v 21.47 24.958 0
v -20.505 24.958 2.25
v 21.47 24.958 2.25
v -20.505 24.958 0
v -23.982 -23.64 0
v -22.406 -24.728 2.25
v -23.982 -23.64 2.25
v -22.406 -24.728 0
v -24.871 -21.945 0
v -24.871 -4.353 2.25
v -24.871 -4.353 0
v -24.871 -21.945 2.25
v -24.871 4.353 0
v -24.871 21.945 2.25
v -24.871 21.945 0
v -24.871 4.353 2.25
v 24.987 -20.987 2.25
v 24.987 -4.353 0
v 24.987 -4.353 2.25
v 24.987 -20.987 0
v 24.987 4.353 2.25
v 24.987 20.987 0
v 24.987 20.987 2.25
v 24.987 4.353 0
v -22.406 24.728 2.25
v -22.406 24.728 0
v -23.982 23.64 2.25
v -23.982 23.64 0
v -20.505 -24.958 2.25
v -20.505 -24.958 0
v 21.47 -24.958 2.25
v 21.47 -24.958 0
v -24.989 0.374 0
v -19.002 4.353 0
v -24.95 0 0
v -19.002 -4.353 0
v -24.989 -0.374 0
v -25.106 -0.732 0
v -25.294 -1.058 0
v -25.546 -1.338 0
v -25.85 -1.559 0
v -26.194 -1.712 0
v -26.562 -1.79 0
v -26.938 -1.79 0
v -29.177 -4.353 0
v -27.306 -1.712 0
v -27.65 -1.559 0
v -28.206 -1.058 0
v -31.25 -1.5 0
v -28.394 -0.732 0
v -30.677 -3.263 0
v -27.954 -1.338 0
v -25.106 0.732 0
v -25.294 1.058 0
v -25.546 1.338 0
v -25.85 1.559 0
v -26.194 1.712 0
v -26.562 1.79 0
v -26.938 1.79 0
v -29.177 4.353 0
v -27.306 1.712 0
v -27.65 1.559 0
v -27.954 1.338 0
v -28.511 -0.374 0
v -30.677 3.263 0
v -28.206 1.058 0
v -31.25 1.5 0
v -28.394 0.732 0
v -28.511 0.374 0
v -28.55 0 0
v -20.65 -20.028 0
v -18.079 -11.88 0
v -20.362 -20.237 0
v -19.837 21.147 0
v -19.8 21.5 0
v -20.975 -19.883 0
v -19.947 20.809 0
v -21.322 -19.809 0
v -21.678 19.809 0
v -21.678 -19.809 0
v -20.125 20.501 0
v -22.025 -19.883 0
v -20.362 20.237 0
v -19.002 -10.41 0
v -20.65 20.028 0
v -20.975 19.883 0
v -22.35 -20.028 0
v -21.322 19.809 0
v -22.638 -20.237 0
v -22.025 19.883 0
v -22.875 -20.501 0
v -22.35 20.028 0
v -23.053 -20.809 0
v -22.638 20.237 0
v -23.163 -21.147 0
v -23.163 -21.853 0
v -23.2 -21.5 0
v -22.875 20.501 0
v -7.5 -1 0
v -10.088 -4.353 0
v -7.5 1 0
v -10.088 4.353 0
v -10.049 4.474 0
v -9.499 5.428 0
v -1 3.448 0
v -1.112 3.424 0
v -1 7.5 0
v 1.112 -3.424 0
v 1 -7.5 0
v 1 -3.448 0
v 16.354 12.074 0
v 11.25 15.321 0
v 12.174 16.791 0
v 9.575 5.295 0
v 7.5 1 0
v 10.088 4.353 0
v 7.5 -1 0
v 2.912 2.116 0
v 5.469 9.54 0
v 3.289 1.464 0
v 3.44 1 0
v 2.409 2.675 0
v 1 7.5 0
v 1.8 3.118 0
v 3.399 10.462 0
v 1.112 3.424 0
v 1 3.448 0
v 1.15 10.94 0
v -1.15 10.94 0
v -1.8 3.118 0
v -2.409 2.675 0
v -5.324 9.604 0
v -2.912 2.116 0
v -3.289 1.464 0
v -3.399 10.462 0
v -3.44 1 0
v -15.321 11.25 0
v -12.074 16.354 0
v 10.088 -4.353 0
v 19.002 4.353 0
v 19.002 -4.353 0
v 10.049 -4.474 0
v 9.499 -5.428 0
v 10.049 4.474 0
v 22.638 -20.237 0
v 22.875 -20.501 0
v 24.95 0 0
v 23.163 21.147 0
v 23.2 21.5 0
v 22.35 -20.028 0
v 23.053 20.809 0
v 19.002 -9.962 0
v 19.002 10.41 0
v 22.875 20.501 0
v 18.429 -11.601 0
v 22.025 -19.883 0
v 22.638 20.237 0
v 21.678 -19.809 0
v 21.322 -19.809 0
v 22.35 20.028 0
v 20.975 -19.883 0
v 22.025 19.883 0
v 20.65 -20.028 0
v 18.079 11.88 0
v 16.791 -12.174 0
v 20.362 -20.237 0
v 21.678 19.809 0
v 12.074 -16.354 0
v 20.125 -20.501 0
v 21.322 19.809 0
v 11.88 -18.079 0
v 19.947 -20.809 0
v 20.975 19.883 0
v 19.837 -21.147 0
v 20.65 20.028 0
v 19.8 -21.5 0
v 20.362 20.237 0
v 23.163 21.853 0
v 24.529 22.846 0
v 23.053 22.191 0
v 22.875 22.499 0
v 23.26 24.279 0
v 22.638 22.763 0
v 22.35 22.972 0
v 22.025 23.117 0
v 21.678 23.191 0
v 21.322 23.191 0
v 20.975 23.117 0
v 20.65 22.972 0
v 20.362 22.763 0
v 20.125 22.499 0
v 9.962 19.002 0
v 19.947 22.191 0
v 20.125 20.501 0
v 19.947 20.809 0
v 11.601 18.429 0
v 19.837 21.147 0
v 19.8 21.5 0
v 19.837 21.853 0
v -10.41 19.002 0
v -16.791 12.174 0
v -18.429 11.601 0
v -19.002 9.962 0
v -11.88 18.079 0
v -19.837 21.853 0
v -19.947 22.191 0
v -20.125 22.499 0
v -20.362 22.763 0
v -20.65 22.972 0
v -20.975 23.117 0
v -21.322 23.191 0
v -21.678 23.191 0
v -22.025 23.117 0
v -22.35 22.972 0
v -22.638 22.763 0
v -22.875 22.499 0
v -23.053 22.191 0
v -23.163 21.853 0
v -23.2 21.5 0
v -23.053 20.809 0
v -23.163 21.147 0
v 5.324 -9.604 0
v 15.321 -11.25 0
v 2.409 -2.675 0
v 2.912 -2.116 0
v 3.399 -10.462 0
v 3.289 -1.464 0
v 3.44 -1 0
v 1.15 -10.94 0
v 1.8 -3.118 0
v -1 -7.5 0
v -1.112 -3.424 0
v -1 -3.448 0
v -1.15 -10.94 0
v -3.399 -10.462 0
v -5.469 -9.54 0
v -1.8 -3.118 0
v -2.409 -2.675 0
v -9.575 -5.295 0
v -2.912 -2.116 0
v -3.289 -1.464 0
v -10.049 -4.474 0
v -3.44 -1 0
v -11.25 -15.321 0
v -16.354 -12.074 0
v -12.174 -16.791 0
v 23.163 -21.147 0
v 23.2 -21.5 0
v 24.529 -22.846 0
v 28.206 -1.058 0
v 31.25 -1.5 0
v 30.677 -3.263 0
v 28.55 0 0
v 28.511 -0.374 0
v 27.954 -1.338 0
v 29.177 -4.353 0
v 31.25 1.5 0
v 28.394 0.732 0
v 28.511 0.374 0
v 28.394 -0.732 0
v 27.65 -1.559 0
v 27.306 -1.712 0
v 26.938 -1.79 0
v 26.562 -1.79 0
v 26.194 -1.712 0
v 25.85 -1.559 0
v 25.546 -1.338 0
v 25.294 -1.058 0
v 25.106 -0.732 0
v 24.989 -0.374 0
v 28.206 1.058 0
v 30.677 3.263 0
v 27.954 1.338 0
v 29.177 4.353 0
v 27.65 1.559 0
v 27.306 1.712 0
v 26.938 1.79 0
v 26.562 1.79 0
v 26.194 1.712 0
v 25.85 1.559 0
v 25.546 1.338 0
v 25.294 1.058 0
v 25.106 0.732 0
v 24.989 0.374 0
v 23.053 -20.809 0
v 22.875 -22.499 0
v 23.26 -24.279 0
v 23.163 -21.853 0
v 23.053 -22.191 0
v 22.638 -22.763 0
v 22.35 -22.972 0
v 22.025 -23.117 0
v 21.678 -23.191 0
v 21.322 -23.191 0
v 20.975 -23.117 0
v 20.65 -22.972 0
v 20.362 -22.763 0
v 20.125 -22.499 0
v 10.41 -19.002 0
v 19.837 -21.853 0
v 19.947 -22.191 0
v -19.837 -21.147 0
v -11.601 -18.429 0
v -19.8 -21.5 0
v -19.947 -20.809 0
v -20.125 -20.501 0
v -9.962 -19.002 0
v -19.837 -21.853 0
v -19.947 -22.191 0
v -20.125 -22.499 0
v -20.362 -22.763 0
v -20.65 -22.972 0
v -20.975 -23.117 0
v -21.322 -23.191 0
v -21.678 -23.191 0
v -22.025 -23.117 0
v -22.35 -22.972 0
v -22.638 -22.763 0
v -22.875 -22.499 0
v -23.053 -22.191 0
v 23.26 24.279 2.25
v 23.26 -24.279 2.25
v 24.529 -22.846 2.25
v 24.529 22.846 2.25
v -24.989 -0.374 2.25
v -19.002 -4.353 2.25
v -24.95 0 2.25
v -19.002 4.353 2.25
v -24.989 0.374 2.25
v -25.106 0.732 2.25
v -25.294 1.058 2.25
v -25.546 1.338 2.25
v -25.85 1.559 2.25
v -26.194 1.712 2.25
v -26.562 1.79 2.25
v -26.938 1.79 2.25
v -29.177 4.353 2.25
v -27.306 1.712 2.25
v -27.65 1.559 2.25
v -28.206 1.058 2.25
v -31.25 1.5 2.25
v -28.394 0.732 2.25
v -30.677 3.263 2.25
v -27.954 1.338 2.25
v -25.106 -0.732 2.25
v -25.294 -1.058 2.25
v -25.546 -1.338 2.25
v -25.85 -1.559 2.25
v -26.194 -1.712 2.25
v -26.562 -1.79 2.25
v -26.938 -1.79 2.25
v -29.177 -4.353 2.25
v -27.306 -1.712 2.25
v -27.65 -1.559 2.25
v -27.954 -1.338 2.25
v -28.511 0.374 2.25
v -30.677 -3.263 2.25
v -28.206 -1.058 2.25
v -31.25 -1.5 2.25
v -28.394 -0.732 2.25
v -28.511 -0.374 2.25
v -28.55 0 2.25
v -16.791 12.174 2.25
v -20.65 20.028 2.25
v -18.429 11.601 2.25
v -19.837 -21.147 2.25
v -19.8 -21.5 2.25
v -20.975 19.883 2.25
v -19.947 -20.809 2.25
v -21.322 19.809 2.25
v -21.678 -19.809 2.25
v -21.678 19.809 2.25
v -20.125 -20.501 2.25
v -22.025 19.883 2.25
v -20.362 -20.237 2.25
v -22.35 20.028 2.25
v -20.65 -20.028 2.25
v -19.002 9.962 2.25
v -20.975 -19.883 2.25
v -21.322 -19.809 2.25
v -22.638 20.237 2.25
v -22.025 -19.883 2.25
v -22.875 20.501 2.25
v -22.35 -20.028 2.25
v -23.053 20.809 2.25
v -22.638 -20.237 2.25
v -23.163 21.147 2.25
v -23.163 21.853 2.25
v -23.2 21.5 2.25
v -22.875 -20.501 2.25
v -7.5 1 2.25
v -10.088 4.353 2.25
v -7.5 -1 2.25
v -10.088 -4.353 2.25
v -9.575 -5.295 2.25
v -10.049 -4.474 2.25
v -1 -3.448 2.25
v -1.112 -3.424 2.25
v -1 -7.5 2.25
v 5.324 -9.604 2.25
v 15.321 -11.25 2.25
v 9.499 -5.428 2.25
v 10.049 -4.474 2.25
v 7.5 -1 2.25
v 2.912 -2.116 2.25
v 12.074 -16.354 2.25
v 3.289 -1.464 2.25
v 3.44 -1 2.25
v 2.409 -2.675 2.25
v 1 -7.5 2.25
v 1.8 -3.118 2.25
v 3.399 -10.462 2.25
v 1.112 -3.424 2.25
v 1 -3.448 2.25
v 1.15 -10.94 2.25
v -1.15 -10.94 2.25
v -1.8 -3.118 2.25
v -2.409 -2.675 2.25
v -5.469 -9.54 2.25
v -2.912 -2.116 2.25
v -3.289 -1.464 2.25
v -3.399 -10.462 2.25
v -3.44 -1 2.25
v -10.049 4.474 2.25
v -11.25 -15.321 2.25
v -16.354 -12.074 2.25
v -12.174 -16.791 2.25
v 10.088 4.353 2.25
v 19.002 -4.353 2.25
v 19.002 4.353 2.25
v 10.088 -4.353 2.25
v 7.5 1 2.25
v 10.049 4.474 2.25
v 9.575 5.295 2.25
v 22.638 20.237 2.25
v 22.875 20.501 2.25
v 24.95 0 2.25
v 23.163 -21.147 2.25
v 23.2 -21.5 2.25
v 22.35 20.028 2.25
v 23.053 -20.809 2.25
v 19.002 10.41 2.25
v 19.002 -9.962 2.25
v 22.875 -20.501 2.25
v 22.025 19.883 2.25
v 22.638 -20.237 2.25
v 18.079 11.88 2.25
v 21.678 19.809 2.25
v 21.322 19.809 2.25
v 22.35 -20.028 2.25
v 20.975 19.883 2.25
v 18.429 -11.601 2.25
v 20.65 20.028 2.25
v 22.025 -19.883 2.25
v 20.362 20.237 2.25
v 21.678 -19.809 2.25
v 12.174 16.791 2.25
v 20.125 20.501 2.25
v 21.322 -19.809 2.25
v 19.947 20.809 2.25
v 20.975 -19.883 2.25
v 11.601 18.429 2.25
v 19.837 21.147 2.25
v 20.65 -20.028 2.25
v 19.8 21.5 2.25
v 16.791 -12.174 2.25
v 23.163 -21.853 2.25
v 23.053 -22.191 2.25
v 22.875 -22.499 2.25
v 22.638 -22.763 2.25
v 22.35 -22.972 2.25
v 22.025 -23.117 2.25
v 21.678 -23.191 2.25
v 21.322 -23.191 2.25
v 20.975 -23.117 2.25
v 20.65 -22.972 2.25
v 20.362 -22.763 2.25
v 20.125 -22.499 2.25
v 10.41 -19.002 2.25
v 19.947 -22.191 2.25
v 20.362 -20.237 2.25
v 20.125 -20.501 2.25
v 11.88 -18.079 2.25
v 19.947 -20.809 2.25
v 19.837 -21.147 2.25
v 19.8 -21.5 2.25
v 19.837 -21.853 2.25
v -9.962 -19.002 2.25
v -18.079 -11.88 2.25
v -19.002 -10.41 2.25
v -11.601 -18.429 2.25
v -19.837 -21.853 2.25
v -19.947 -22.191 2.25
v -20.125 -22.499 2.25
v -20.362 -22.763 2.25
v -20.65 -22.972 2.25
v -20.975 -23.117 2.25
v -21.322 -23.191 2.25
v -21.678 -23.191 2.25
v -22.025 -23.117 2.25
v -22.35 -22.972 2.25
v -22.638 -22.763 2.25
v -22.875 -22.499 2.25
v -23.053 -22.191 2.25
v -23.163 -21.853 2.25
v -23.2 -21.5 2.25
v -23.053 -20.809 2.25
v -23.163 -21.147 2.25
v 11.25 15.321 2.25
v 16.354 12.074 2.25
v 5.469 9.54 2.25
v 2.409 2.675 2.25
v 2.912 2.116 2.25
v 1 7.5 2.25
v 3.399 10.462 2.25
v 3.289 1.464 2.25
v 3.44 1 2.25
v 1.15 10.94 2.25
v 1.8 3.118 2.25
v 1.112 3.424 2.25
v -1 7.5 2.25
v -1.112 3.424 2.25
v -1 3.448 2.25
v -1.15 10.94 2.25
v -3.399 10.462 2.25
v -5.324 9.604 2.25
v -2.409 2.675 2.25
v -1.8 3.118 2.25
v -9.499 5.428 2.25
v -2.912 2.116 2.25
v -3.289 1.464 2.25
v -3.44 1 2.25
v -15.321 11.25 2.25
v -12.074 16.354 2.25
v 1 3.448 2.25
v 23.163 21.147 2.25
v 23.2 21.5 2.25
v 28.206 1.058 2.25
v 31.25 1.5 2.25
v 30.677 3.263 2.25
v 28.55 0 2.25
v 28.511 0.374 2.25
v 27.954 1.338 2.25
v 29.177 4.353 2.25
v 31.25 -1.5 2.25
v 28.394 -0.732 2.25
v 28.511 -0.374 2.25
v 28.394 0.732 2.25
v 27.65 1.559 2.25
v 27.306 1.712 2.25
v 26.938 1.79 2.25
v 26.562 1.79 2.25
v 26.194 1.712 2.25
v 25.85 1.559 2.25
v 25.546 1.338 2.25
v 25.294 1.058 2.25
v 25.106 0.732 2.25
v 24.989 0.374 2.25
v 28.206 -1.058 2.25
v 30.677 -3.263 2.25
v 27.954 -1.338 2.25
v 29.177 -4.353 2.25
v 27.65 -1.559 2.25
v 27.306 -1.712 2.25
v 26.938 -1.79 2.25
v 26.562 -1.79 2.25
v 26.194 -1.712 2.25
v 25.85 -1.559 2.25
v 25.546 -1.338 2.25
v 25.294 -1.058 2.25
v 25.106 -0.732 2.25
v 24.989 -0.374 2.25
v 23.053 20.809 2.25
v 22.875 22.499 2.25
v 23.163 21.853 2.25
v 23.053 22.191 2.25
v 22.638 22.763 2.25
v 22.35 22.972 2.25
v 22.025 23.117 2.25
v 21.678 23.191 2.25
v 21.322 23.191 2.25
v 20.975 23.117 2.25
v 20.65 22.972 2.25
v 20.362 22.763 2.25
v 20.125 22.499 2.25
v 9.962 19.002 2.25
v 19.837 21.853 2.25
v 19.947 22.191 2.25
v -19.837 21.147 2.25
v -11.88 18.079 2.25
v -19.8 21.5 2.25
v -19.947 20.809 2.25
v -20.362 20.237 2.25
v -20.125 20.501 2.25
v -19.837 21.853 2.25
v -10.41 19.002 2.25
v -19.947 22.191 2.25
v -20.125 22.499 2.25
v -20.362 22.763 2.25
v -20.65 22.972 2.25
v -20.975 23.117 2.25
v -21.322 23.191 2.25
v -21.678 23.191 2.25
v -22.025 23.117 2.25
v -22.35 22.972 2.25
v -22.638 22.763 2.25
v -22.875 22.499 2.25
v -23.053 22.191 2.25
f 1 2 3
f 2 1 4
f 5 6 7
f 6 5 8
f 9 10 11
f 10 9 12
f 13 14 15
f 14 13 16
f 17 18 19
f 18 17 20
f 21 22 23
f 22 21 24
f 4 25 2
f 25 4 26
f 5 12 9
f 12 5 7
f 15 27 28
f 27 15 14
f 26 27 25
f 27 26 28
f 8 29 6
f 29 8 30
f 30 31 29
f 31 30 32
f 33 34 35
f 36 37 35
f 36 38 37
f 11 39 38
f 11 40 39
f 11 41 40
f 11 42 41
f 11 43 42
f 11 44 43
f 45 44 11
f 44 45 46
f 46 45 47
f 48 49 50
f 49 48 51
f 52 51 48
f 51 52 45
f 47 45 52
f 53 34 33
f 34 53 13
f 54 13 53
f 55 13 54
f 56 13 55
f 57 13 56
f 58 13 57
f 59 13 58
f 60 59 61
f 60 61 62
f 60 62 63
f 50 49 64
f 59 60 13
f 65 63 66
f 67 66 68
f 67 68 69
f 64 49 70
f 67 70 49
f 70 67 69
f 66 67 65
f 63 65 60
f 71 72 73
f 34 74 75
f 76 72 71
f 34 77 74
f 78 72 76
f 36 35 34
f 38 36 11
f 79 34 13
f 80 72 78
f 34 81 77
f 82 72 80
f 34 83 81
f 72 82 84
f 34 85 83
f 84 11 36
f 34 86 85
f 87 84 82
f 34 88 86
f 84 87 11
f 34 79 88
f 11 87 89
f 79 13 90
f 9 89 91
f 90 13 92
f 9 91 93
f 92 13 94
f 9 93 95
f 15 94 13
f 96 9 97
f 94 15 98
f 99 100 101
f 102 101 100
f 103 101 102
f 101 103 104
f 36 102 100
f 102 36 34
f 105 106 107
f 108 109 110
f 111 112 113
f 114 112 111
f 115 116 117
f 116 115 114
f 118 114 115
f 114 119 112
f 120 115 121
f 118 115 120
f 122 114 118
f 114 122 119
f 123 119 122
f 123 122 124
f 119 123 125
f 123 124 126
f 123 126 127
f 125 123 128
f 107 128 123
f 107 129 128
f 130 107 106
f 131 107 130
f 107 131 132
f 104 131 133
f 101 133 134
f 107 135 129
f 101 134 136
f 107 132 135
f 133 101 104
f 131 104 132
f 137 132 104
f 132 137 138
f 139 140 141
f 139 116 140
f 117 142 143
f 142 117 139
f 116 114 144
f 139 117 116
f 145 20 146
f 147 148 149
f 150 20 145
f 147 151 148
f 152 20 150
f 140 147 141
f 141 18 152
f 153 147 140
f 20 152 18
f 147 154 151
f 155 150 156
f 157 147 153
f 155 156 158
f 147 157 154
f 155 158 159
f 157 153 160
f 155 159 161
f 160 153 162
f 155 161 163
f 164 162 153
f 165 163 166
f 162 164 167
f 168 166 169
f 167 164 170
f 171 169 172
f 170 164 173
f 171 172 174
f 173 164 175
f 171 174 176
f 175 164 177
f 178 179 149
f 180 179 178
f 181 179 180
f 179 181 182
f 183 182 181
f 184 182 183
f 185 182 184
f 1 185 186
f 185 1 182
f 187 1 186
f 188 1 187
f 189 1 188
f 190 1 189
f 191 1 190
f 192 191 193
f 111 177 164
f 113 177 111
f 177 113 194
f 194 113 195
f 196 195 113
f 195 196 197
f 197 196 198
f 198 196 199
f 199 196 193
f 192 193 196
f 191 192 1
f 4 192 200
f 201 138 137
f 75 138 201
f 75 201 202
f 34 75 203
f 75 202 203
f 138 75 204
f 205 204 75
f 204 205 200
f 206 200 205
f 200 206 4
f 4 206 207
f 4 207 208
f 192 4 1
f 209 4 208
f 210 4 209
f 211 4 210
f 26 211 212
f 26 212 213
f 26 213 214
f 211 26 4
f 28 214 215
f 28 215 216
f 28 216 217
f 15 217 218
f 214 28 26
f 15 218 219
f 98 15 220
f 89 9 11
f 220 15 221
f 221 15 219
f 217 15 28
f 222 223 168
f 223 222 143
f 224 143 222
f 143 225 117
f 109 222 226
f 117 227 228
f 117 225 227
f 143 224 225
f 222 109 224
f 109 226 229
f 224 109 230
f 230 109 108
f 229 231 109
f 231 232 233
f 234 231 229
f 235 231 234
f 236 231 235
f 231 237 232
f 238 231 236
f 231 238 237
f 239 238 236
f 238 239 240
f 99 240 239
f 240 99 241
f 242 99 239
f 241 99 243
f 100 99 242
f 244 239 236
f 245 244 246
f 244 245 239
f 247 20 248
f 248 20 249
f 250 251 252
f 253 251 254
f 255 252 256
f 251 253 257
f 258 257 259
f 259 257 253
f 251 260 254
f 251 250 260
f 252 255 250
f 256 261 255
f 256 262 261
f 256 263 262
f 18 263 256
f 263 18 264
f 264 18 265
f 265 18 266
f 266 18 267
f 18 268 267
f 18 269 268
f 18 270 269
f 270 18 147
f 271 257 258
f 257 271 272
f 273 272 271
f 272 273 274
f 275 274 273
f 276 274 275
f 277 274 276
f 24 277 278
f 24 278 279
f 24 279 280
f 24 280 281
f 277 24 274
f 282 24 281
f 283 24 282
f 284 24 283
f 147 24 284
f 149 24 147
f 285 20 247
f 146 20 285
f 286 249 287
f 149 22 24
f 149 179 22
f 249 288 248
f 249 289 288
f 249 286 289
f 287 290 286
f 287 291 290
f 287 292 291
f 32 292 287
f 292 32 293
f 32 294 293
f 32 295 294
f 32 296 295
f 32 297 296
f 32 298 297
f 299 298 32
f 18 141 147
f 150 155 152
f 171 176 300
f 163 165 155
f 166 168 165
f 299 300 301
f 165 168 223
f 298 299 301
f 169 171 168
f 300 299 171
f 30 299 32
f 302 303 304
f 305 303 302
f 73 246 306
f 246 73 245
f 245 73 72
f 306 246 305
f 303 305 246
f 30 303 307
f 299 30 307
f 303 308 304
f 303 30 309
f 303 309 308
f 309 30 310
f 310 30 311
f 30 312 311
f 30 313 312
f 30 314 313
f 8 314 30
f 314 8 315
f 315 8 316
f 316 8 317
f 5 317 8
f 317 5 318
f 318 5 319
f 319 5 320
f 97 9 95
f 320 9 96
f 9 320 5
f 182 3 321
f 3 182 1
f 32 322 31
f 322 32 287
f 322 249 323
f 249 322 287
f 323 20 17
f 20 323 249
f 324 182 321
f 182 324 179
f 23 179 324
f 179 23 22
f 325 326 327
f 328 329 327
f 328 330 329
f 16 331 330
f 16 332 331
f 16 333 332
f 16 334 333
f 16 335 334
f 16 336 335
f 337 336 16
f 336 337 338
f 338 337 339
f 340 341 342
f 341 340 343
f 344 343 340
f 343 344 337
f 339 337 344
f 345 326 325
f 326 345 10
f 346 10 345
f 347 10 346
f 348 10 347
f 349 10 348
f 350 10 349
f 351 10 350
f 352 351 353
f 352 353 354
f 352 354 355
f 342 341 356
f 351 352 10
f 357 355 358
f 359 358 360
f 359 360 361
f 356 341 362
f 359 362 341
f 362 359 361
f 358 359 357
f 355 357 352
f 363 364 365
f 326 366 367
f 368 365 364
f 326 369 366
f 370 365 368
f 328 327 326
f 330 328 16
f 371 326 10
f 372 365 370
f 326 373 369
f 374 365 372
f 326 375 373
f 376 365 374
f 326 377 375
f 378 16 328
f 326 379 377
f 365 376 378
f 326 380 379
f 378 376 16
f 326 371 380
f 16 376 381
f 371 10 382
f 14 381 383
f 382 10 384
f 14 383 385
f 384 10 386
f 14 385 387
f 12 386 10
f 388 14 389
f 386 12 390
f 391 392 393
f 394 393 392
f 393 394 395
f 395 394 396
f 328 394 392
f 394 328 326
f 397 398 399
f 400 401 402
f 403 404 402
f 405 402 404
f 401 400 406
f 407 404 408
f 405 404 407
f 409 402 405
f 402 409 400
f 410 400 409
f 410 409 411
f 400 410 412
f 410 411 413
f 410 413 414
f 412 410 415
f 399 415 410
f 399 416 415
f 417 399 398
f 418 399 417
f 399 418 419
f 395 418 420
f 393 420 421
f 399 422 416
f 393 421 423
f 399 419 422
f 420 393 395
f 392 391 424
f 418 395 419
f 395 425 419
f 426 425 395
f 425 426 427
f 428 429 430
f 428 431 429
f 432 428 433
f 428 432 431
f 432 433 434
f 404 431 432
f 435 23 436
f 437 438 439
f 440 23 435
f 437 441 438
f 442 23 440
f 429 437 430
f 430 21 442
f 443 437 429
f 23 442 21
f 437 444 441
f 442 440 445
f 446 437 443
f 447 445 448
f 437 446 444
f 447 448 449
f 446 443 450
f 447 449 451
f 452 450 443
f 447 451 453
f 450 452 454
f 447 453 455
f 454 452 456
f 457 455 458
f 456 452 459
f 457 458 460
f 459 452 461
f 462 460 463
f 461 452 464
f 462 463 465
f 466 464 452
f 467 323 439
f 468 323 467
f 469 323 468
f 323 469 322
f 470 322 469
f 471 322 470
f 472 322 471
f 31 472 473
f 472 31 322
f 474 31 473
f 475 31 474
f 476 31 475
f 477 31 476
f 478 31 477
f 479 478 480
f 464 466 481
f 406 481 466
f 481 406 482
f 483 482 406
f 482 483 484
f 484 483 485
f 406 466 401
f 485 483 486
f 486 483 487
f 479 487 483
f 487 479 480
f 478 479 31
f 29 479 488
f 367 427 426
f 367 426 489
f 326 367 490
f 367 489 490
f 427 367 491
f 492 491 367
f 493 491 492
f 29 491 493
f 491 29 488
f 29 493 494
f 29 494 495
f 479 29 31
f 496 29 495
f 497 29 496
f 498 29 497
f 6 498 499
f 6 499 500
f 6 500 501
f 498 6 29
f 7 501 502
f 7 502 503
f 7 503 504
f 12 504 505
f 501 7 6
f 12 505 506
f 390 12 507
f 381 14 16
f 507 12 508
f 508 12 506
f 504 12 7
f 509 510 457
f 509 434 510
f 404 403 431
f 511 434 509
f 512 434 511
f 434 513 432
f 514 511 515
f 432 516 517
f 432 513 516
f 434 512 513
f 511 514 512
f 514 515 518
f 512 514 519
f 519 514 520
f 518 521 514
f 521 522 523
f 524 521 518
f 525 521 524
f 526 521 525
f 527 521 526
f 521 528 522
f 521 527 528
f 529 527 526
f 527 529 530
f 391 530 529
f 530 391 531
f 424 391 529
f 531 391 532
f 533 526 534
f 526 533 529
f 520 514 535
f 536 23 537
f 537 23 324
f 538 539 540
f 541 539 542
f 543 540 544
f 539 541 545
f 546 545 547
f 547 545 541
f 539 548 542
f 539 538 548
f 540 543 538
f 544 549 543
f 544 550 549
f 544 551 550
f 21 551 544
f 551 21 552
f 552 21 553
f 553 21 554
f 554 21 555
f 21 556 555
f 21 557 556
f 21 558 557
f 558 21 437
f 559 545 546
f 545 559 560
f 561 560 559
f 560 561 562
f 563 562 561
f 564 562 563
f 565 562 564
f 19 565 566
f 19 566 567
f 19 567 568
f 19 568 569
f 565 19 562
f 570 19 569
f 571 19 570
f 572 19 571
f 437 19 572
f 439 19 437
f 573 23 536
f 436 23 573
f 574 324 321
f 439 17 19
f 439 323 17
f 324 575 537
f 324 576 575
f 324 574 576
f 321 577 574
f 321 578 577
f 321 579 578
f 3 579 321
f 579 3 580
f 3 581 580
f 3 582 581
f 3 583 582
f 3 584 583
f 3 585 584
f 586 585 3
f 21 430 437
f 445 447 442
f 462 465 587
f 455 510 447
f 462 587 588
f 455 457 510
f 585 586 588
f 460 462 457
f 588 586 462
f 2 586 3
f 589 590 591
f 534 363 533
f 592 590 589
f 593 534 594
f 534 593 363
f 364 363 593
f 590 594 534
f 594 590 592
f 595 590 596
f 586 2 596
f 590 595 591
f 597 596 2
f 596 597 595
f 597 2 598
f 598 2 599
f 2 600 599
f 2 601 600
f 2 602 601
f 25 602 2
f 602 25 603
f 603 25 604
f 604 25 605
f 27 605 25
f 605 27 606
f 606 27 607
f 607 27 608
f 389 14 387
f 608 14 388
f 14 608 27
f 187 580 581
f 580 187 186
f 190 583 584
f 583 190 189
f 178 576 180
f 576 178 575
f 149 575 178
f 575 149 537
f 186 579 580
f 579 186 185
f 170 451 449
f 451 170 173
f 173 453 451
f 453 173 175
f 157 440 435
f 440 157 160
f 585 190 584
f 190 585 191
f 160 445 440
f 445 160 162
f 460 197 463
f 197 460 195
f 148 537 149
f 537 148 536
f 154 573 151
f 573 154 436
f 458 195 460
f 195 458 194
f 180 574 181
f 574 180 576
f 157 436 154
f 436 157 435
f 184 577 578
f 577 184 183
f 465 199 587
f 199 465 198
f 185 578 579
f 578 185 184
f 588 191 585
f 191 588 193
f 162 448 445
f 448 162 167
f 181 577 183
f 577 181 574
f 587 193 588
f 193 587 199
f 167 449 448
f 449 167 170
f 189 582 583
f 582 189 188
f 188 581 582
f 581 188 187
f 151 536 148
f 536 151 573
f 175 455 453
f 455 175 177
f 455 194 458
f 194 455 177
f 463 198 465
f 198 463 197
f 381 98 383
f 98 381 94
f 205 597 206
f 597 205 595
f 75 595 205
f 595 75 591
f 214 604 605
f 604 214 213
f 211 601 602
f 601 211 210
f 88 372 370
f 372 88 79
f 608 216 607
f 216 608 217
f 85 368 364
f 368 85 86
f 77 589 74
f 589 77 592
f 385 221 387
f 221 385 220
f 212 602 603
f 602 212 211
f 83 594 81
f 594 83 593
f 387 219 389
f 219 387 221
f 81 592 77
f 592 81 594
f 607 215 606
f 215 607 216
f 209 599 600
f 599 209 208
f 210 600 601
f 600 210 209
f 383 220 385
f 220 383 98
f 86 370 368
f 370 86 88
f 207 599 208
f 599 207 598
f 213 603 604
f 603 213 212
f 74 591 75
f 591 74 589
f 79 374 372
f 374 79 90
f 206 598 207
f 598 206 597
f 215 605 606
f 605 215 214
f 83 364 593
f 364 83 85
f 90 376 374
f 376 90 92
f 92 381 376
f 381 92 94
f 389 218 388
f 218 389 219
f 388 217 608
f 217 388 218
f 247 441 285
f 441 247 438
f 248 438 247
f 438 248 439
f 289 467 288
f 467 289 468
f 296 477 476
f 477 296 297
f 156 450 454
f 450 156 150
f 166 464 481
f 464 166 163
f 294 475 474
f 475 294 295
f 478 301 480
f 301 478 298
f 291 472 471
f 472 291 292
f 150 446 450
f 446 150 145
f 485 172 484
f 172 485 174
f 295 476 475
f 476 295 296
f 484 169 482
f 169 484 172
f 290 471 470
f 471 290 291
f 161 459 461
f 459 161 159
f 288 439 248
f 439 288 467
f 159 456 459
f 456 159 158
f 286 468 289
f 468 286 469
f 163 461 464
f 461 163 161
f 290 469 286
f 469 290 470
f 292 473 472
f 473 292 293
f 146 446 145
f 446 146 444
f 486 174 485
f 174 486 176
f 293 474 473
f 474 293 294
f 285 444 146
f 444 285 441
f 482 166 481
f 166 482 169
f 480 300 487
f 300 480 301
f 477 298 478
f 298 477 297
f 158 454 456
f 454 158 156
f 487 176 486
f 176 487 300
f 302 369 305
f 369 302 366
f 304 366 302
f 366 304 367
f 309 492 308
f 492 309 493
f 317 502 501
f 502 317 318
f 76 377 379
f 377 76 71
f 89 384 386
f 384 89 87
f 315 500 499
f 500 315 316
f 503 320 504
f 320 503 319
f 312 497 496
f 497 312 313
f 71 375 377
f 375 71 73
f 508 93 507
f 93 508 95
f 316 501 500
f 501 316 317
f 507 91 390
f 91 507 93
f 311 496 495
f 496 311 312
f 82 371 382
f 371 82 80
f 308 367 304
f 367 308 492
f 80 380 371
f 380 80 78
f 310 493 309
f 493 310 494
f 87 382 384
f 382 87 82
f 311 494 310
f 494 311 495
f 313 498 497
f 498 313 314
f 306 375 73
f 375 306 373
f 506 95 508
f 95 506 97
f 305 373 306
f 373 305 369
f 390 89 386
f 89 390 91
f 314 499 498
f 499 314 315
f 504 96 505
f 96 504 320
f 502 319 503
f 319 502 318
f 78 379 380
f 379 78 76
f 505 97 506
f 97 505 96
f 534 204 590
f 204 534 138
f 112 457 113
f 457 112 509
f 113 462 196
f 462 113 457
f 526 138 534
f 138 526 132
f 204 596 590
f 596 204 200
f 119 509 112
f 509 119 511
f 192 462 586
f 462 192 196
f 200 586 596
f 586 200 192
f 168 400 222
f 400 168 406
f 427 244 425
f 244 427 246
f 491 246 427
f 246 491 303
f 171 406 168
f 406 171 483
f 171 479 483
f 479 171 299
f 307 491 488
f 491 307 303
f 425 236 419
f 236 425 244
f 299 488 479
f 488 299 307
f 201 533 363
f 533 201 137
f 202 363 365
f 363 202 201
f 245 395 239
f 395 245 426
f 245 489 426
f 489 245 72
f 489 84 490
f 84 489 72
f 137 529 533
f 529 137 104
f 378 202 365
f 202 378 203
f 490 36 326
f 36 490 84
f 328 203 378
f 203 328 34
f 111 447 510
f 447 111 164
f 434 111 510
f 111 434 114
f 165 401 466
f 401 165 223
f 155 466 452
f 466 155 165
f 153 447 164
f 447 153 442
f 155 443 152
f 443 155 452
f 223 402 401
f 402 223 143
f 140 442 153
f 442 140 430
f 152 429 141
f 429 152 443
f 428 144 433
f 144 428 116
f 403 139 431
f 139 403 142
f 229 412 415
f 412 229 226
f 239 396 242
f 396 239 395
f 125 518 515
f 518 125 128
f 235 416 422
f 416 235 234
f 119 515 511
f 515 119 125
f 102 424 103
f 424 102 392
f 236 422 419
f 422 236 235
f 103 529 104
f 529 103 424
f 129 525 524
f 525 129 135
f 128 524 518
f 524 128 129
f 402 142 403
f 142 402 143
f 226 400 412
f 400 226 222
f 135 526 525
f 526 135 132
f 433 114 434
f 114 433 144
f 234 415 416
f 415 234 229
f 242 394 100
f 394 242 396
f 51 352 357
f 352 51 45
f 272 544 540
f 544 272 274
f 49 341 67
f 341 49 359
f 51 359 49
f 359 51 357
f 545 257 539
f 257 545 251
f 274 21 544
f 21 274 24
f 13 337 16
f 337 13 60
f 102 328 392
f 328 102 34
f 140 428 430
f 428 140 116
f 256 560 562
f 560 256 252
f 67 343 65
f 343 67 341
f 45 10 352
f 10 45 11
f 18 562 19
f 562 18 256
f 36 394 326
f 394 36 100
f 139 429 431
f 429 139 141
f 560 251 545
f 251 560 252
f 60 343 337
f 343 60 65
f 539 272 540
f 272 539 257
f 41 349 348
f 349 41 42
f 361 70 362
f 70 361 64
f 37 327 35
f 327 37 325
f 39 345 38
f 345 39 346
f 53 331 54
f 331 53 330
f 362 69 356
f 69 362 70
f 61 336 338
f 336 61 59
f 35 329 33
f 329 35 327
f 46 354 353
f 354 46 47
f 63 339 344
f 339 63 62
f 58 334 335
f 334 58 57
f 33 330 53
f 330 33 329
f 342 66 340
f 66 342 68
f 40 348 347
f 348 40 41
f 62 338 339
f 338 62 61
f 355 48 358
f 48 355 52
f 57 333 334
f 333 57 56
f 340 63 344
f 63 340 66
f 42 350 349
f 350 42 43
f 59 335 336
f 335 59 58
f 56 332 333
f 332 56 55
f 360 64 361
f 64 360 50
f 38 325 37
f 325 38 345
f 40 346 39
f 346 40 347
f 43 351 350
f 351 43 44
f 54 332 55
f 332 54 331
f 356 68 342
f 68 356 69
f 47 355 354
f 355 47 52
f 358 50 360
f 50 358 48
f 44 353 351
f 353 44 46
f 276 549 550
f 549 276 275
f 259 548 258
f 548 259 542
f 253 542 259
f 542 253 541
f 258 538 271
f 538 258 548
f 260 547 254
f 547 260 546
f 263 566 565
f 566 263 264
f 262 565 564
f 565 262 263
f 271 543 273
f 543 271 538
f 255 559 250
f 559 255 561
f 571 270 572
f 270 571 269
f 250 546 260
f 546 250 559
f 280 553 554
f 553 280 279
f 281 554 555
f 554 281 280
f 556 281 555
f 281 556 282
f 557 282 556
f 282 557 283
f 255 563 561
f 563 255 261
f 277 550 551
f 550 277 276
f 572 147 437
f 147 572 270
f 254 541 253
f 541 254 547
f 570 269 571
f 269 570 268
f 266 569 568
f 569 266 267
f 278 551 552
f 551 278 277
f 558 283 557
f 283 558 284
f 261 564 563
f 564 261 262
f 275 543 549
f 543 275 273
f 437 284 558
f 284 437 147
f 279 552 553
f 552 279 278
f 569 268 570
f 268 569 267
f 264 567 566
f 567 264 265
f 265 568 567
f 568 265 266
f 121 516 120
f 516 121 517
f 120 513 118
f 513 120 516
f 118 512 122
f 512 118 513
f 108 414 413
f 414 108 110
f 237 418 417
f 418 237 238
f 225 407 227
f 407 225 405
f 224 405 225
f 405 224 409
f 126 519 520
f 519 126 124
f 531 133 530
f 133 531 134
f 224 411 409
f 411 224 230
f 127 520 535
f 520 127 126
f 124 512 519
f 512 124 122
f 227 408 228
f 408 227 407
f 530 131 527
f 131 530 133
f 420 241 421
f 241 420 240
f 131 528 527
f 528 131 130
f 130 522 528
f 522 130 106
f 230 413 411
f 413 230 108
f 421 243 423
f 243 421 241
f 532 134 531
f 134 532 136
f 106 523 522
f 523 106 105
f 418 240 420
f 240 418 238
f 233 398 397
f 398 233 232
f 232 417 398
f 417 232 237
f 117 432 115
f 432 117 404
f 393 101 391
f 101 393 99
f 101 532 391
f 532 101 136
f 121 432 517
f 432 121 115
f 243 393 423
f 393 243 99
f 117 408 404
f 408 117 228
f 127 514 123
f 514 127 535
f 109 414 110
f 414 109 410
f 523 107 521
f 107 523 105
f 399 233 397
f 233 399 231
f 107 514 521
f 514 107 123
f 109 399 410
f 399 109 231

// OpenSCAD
// file: dronePlates.scad
/**
 * dronePlates.scad
 * Plate library
 *
 * GNU GPL V3
 * @author: Victor Potenciano
 */

m3Rad = 3.4/2;
cornerR = 4;

/**
 *
 */
module helperDisk(diameter) {
	cylinder(r = diameter/2, h = 0.6, $fn=20);
}

/**
 *
 */
module roundedRect(size, radius) {
	x = size[0];
	y = size[1];
	z = size[2];

	linear_extrude(height=z)
	hull() {
	// place 4 circles in the corners, with the given radius
	translate([(-x/2)+(radius/2), (-y/2)+(radius/2), 0]){ circle(r=radius); }
	translate([(x/2)-(radius/2), (-y/2)+(radius/2), 0]){ circle(r=radius); }
	translate([(-x/2)+(radius/2), (y/2)-(radius/2), 0]){ circle(r=radius); }
	translate([(x/2)-(radius/2), (y/2)-(radius/2), 0]){ circle(r=radius); }
	}
}

/**
 * rounded rectangle triangle with corner at origin
 */
module roundedTriangle(size, radius) {
	x = size[0];
	y = size[1];
	z = size[2];

	linear_extrude(height=z)
	hull() {
	translate([radius, radius, 0]){ circle(r=radius); }
	translate([x-radius, radius, 0]){ circle(r=radius); }
	translate([radius, y-radius, 0]){ circle(r=radius); }
	}
}

/**
 *
 */
module roundRectPlate(w, l, plateThick=3) {
	difference(){
		roundedRect([l+m3Rad*1.75,w+m3Rad*1.75,plateThick], cornerR);
		translate([l/2, w/2, -0.5]) { cylinder(h = plateThick+1, r = m3Rad, $fn=30); }
		translate([-l/2, w/2, -0.5]) { cylinder(h = plateThick+1, r = m3Rad, $fn=30); }
		translate([l/2, -w/2, -0.5]) { cylinder(h = plateThick+1, r = m3Rad, $fn=30); }
		translate([-l/2, -w/2, -0.5]) { cylinder(h = plateThick+1, r = m3Rad, $fn=30); }
	}
}

/**
 *
 */
module crossSquarePlate(l, thick=3) {
	inDist = cornerR*2+4;
	trianL = sqrt((l*l)/2)-inDist;
	centerR = 4;

	difference(){
		roundRectPlate(l, l, thick);
		translate([0, centerR, -0.5]) { 
			rotate([0,0,45]){ roundedTriangle([trianL,trianL,thick+1], cornerR-2); }
		}
		translate([0, -centerR, -0.5]) { 
			rotate([0,0,225]){ roundedTriangle([trianL,trianL,thick+1], cornerR-2); }
		}
		translate([-centerR, 0, -0.5]) { 
			rotate([0,0,135]){ roundedTriangle([trianL,trianL,thick+1], cornerR-2); }
		}
		translate([centerR, 0, -0.5]) { 
			rotate([0,0,-45]){ roundedTriangle([trianL,trianL,thick+1], cornerR-2); }
		}
	}
}

/**
 *
 */
module hShapePlate(w, l, thick=4) {
	inDist = cornerR*2+1;

	difference(){
		roundRectPlate(w, l, thick);
		translate([0, w/4, -0.5]) { roundedRect([l-inDist,w/2-inDist,thick+1], cornerR-2); }
		translate([0, -w/4, -0.5]) { roundedRect([l-inDist,w/2-inDist,thick+1], cornerR-2); }
	}
}

/**
 *
 */
module motorCircleMount(inDia, outDia, thick=3, extraH=false, d1=19, d2=16, holeR=m3Rad ) {
	difference(){
		cylinder(h = thick, r = outDia/2, $fn=30);
		motorCircleMountHoles(inDia, outDia, thick, extraH, d1=d1, d2=d2, holeR=holeR);
	}
}

/**
 *
 */
module motorCircleMountHoles(inDia, outDia, thick=3, extraH=false, d1=19, d2=16, d3=25, holeR=m3Rad) {
	translate([0, 0, -0.5]) { cylinder(h = thick+1, r = inDia/2, $fn=30); }

	for(i=[0:3]) {
		rotate([0,0,90*i]){
		translate([d1/2, 0, -0.5]) cylinder(h = thick+1, r = holeR, $fn=20);
		translate([d2/2, 0, -0.5]) cylinder(h = thick+1, r = holeR, $fn=20);
		translate([d2/2, -holeR, -0.5]) cube(size = [(d1-d2)/2,holeR*2,thick+1]);
		}
	}
	
	if(extraH==true){	
		for(i=[-1,1]) translate([i*d3/2, 0, -0.5]) { cylinder(h = thick+1, r = holeR, $fn=30); }
	}
}

/**
 *
 */
module motorRectMount(w, l, inDia, thick=3) {
	d1=19;
	d2=16;

	difference(){
		roundRectPlate(w, l, thick);
		translate([0, 0, -0.5]) { cylinder(h = thick+1, r = inDia/2, $fn=30); }
		translate([0, d1/2, -0.5]) { cylinder(h = thick+1, r = m3Rad, $fn=30); }
		translate([0, -d1/2, -0.5]) { cylinder(h = thick+1, r = m3Rad, $fn=30); }
		translate([d2/2, 0, -0.5]) { cylinder(h = thick+1, r = m3Rad, $fn=30); }
		translate([-d2/2, 0, -0.5]) { cylinder(h = thick+1, r = m3Rad, $fn=30); }
	}
}

/**
 *
 */
module tube(inDia, outDia, height) {
	difference(){
		cylinder(h = height, r = outDia/2, $fn=50);
		translate([0, 0, -0.5]) { cylinder(h = height+1, r = inDia/2, $fn=30); }
	}
}

/**
 *
 */
module squareTube(inDia, outDia, height) {
	translate([0,0,height/2]){
	difference(){
		cube(size = [outDia,outDia,height], center = true);
		cube(size = [inDia,inDia,height+1], center = true);
	}
	}
}

/**
 *
 */
module djiFlamewheelHoles(height) {
	a = 23;
	b = 16;
	c = 19.5;
	
	translate([a/2, c/2, 0]) { cylinder(h = height, r = m3Rad, $fn=30); }
	translate([-a/2, c/2, 0]) { cylinder(h = height, r = m3Rad, $fn=30); }
	translate([b/2, -c/2, 0]) { cylinder(h = height, r = m3Rad, $fn=30); }
	translate([-b/2, -c/2, 0]) { cylinder(h = height, r = m3Rad, $fn=30); }
}

/**
 *
 */
module djiFlamewheelHolesBotton(height) {
	a1 = 21;
	c = 19.5;
	
	translate([a1/2, c/2, 0]) { cylinder(h = height, r = m3Rad, $fn=30); }
	translate([-a1/2, c/2, 0]) { cylinder(h = height, r = m3Rad, $fn=30); }
}

/**
 *
 */
module propeller(size){
union(){
difference(){
	cylinder(h = 3, r = size/2, center=true, $fn=30);
	cylinder(h = 3.1, r = size/2-2, center=true, $fn=30); 
}
for( i = [-1,1] ){
rotate([0,0,45*i]){ cube(size = [size,4,1], center = true); }
}
}
}

/**
 *
 */
module slot(length, height, rad){
for(i=[-1,1]) translate([i*length/2,0,0]) cylinder(h = height, r = rad, $fn=30);
translate([0,0,height/2]) cube(size = [length,rad*2,height], center = true);
}

 

////////////////////////
// Examples:
////////////////////////

motorCircleMount(8, 25, 3.5);

//roundedRect([50,50,3], 4);

//hShapePlate(79, 25);

//rotate([0,0,45]){roundedTriangle([40,40,3], 4);}

//crossSquarePlate(45, 4);

/*
union(){
motorRectMount(21, 18, 8, 4);
translate([9, 10.5, 0]) {tube(m3Rad*2, 6.5, 6);}
}
*/

/*
difference(){
union(){
hShapePlate(50, 30, 3.5);
translate([-4,-25,0]){cube(size = [8,50,3.5]);}
rotate([0, 0, 45]) {motorCircleMount(8, 35, 3.5);}
}
cylinder(h = 10, r = 4, $fn=100, center=true);
}
*/

//rotate([90,0,0]){ tube(5,10,20); }
//translate([20,0,0]){ squareTube(5, 10, 20); }
// main file
/**
 * cinetank mk2 plate for neo7 GPS
 */

use <dronePlates.scad>

m3Rad = 3.6/2;
plateThick = 2.25;
holeDist=53.5;

/**
 *
 */
module gpsPlate() {
difference(){
union(){
	crossSquarePlate(43, thick=plateThick);
	cylinder(h = plateThick, r = 11, $fn=30);
	roundedRect([holeDist+6,6,plateThick], 3);
//	for(i=[-1,1]) for(j=[-1,1]) translate([i*27,j*28,0]) helperDisk(22);
	
}//union

	cylinder(h = plateThick+5, r =m3Rad*2 , $fn=30, center=true);
	cube(size = [15,2,plateThick+5], center = true);
	cube(size = [2,15,plateThick+5], center = true);

	for(i=[-1,1]) translate([i*holeDist/2,0,-0.5]) cylinder(h = plateThick+1, r = m3Rad, $fn=30);
}//diff
}



translate([0,0,0]) gpsPlate();
